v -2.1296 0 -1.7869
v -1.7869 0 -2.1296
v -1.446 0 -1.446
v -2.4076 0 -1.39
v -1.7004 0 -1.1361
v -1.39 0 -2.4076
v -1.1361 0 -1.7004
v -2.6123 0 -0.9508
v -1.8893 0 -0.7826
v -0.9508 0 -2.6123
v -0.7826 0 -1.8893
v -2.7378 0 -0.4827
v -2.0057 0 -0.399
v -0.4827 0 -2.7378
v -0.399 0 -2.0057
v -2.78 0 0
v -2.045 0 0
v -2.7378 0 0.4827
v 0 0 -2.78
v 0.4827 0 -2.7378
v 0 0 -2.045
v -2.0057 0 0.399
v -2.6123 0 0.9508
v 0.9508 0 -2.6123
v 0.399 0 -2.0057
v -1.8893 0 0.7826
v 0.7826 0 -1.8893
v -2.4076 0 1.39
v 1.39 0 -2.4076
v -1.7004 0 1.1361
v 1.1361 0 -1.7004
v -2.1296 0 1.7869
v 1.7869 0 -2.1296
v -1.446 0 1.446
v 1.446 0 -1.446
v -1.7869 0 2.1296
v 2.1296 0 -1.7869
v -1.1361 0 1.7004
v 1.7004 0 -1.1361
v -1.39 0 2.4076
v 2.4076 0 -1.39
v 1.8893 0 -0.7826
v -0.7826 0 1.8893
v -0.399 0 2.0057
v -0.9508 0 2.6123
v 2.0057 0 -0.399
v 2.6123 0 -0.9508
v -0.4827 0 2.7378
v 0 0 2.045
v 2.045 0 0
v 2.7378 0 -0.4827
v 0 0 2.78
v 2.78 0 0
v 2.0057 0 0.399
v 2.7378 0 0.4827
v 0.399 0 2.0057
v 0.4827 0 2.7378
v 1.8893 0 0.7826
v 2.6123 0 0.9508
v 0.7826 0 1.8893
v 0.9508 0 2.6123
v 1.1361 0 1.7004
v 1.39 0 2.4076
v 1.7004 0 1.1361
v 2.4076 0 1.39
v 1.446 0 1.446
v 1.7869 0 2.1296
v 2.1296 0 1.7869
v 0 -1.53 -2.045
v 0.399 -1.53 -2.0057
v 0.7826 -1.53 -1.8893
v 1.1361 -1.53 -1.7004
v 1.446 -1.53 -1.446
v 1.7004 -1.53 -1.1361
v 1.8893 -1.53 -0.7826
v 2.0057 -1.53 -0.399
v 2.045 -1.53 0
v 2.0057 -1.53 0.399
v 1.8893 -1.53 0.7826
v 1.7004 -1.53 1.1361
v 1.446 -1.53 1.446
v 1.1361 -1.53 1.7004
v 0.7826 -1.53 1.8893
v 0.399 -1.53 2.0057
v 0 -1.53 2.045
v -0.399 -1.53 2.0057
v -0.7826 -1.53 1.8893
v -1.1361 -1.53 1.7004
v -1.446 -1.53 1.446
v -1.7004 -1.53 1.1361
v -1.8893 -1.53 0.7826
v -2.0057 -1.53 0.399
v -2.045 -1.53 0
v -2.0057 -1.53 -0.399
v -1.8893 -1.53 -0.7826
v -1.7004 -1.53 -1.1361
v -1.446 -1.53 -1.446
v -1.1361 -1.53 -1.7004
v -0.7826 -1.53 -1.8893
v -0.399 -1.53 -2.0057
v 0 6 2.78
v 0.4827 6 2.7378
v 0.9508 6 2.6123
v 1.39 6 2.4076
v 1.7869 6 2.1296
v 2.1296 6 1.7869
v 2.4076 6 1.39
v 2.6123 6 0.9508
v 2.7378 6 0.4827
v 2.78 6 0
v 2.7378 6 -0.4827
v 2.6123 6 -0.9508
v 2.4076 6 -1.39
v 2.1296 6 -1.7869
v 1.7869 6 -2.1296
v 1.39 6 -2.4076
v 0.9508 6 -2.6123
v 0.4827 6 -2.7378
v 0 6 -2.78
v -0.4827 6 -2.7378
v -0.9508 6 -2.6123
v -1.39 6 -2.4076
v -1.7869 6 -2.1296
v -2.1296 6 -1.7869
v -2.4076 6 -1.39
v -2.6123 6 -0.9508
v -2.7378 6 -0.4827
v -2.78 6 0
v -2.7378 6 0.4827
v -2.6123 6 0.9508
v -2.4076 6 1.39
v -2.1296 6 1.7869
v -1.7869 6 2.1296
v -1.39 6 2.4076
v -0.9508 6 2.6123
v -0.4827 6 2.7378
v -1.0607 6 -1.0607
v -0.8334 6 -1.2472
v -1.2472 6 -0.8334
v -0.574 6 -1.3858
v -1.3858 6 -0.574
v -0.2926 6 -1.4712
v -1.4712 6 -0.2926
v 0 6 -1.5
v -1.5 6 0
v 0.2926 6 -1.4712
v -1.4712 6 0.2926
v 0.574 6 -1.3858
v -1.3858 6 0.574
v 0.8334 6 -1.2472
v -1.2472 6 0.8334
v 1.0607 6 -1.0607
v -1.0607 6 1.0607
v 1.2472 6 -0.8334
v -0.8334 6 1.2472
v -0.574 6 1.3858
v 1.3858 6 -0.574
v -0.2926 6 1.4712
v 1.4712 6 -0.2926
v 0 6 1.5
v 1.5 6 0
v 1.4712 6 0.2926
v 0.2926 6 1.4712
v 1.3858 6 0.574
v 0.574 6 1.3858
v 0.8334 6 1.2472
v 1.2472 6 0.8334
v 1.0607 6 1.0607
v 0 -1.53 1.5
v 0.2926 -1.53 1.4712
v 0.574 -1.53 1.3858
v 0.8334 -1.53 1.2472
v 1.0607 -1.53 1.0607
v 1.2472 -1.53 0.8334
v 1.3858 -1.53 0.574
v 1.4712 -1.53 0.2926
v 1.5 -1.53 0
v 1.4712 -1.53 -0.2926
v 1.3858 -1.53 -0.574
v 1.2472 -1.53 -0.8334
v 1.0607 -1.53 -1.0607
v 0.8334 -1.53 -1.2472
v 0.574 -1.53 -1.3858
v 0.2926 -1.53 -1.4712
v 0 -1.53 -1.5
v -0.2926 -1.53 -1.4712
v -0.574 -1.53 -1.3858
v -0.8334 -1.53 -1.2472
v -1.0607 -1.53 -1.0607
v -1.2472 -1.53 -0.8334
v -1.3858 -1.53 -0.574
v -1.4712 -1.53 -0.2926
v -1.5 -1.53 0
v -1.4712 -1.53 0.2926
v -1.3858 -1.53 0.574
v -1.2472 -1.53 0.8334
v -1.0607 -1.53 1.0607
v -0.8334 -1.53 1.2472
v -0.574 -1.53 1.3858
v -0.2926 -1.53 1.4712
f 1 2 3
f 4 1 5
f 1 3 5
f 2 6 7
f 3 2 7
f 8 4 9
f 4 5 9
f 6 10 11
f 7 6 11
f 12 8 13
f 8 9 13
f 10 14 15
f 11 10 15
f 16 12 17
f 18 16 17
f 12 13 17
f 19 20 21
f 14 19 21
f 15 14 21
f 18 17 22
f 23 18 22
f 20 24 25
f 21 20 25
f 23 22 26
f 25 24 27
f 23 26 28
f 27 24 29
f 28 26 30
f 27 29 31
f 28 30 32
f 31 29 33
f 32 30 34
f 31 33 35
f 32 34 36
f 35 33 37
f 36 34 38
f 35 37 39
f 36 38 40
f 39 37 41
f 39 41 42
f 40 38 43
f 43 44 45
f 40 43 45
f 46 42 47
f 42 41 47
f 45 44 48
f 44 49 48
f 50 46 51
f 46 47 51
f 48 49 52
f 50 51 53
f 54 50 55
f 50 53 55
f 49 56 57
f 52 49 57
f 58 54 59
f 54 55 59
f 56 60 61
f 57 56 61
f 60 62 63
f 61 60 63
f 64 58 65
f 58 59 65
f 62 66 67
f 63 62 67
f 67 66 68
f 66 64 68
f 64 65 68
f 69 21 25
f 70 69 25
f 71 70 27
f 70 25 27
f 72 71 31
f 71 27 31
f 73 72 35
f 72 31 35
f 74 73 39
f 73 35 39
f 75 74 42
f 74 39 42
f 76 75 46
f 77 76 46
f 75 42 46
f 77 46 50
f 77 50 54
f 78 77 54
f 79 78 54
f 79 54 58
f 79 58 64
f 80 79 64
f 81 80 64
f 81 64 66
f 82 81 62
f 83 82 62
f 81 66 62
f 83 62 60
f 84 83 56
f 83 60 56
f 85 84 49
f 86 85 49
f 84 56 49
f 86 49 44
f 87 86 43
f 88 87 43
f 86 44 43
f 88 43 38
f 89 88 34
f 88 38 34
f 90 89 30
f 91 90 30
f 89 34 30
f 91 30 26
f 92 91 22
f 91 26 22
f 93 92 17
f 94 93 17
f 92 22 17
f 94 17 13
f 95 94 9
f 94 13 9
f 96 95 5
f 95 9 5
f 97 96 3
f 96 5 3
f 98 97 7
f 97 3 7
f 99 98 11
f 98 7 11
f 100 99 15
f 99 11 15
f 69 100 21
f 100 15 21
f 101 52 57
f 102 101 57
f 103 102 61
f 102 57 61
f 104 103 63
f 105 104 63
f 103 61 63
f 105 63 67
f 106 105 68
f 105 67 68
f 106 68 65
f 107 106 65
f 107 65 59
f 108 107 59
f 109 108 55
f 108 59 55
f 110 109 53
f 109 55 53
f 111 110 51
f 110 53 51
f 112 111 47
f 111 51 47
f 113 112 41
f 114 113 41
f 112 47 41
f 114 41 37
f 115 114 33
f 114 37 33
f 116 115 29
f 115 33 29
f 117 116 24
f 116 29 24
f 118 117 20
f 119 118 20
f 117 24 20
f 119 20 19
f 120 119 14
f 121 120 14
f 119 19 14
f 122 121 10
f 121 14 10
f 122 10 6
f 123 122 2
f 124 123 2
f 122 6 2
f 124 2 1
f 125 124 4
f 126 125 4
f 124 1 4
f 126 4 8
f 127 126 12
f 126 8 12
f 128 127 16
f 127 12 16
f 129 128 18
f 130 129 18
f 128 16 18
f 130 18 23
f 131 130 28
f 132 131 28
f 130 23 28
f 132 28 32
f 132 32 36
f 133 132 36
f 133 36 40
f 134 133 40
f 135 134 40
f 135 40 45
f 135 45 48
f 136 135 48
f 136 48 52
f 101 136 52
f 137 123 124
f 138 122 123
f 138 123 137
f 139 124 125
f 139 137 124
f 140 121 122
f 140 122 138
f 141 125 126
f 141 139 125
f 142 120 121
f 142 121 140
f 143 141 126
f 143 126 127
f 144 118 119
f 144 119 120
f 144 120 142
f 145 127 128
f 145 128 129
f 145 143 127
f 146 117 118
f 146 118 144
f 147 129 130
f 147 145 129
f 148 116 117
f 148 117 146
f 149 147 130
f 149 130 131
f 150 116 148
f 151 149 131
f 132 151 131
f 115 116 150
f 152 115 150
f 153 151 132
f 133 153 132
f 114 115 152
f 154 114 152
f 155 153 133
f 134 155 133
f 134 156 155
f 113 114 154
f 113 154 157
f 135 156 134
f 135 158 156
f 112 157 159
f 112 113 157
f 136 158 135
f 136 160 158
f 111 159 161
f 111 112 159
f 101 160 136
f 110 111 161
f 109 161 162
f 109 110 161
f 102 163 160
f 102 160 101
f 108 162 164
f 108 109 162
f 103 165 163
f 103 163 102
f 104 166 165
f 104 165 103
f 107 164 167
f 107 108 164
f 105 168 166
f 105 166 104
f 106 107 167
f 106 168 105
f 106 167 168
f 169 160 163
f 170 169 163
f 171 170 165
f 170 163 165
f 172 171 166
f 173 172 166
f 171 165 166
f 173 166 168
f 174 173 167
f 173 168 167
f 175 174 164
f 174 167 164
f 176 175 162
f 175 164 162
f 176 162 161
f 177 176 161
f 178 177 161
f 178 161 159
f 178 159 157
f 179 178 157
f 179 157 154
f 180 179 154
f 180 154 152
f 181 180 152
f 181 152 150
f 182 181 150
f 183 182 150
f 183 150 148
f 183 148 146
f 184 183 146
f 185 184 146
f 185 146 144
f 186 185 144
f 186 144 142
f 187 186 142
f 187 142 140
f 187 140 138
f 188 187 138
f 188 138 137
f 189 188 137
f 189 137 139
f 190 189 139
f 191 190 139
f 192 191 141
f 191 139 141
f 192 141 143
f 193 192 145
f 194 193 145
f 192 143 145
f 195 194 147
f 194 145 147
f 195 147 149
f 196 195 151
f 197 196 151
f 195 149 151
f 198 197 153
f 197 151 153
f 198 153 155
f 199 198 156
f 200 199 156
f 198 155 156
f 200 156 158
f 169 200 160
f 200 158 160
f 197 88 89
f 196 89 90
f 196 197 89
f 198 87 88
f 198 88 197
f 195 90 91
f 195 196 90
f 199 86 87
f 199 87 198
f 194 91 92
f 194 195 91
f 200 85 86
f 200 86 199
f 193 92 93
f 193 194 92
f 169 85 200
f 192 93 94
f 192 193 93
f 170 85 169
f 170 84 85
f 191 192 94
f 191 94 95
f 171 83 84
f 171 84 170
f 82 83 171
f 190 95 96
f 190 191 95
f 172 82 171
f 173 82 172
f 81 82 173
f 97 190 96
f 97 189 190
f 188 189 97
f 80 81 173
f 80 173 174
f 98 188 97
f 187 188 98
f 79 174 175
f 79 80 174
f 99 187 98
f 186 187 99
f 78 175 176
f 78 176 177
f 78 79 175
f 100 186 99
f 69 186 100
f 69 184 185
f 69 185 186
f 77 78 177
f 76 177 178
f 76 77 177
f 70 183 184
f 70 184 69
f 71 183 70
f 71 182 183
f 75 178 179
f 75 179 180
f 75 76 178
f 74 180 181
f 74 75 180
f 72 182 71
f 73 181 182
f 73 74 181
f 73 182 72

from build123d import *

# Parameters (mm, degrees)
SKETCH_1_R          = 2.78
EXTRUDE_1_DEPTH     = 6
SKETCH_2_R          = 2.045
EXTRUDE_2_DEPTH     = 1.53
CUT_EXTRUDE_1_REACH = 10.495
SKETCH_3_R          = 1.5


with BuildPart() as part:
    # 草图1 → 凸台-拉伸1 (new body)
    with BuildSketch(Plane(origin=(0, 0, 0), x_dir=(1, 0, 0), z_dir=(0, 1, 0))):
        with Locations(Location((0, 0, 0), (0, 0, 270))):
            Circle(SKETCH_1_R)
    extrude(amount=EXTRUDE_1_DEPTH)

    # 草图2 → 凸台-拉伸2 (add)
    with BuildSketch(Plane.XZ):
        with Locations(Location((0, 0, 0), (0, 0, 270))):
            Circle(SKETCH_2_R)
    extrude(amount=EXTRUDE_2_DEPTH)

    # 草图3 → 切除-拉伸1 (cut, up to next)
    with BuildSketch(Plane(origin=(0, 6, 0), x_dir=(1, 0, 0), z_dir=(0, 1, 0)), mode=Mode.PRIVATE) as cut_extrude_1_sk1:
        with Locations(Location((0, 0, 0), (0, 0, 270))):
            Circle(SKETCH_3_R)
    cut_extrude_1_tool1 = extrude(cut_extrude_1_sk1.sketch, amount=-CUT_EXTRUDE_1_REACH, mode=Mode.PRIVATE) & part.part
    add(cut_extrude_1_tool1.solids().sort_by_distance((0, 6, 0))[0], mode=Mode.SUBTRACT)


solid = part.part
